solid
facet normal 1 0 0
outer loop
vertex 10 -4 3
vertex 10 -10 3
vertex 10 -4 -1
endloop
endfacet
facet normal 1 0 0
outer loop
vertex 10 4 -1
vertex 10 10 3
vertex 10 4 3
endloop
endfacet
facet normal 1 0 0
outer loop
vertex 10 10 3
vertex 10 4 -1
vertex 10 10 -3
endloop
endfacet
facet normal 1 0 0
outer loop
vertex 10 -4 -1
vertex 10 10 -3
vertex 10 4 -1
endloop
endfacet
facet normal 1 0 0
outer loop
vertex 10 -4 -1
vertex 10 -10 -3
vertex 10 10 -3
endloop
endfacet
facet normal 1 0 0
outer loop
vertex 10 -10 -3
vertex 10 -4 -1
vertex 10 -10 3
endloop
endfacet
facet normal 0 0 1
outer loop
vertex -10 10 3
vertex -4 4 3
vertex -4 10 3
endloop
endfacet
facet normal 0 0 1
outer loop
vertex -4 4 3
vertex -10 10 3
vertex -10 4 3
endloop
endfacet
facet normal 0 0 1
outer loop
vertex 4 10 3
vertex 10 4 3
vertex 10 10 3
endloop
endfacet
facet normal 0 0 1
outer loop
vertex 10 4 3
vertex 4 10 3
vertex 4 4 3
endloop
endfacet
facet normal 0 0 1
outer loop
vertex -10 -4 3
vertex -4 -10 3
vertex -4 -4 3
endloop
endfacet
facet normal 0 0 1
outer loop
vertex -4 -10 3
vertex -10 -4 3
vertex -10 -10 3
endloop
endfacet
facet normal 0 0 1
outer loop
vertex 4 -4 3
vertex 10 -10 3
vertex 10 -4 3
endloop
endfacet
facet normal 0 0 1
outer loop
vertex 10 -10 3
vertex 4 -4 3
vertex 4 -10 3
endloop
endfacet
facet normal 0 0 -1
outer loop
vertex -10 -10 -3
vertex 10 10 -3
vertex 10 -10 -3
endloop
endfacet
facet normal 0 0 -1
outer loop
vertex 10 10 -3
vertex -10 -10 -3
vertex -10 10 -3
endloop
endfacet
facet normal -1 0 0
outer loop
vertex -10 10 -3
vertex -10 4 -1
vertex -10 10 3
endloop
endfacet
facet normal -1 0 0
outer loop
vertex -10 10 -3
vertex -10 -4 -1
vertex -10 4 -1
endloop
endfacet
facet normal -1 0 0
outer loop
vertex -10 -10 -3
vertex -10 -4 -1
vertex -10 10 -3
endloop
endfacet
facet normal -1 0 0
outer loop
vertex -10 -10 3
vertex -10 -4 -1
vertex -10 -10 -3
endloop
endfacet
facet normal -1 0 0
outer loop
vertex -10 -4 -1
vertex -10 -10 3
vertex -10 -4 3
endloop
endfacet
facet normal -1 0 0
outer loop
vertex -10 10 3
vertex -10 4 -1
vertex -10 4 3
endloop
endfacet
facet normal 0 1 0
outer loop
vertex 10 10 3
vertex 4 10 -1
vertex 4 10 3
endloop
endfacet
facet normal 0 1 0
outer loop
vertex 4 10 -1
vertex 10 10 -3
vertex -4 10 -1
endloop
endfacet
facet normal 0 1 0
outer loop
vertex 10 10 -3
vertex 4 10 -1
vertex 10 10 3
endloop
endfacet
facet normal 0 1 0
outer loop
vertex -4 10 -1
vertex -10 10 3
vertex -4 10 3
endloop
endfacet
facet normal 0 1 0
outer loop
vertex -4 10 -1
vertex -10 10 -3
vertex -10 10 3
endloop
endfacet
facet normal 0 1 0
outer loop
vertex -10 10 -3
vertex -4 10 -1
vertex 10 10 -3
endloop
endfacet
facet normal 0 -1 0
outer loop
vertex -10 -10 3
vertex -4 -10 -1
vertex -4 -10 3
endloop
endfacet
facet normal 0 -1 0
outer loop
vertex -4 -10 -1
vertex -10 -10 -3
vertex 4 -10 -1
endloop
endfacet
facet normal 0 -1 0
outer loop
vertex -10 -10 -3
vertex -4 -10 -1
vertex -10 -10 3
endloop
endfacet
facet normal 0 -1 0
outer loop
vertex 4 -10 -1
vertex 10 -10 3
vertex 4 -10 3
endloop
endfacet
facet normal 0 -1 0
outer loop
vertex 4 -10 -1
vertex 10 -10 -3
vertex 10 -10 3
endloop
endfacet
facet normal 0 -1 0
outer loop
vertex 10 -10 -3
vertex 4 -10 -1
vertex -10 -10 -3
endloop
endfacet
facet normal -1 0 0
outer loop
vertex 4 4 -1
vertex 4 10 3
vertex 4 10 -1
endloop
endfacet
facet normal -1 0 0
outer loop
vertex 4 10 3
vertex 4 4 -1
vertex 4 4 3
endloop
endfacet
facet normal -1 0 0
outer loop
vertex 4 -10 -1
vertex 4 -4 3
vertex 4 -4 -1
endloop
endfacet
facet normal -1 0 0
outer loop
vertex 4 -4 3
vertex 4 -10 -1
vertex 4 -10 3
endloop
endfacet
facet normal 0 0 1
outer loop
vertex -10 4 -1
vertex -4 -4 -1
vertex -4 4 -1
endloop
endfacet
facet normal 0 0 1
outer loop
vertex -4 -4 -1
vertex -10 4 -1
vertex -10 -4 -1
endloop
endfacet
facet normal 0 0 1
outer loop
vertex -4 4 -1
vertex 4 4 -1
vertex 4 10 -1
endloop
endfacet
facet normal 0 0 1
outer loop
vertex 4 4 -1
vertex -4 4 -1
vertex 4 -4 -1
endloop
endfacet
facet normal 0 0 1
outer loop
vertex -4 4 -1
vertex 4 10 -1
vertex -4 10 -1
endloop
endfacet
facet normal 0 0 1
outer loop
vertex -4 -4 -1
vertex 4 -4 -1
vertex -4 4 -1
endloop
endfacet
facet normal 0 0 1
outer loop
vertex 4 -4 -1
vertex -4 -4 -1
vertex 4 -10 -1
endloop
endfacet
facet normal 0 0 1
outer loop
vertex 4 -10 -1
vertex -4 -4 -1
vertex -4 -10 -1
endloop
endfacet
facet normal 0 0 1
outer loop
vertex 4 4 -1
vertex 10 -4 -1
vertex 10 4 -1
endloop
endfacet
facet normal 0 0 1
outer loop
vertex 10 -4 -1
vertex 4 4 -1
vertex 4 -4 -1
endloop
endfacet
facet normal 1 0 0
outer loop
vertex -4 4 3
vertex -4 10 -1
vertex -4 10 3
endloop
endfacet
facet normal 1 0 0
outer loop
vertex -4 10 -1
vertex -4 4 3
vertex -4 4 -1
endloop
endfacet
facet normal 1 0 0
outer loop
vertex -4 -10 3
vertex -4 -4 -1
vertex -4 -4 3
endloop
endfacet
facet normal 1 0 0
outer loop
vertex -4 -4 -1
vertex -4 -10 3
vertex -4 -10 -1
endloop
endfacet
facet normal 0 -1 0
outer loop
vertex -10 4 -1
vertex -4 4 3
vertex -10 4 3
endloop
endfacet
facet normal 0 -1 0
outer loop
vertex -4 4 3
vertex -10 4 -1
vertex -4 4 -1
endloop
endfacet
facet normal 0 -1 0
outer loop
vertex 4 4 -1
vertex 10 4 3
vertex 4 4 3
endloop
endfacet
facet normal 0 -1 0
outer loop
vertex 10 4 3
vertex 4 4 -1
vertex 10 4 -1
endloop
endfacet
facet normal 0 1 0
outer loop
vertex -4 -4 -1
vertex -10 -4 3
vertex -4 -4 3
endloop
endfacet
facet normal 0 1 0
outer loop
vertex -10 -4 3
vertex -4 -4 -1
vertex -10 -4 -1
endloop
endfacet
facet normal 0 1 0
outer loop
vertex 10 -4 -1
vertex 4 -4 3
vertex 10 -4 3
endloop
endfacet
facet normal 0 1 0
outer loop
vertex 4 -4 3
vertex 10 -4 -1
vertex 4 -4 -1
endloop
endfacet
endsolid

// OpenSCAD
length=20;
height=6;
width=20;
proportion=2.5;
difference(){
cube(size=[length,width,height],center=true);
translate([0,-width/proportion,height/3])
     cube(size=[length/proportion,width*4,height],center=true);
translate([-length/proportion,0,height/3])
     cube(size=[length*4,width/proportion,height],center=true);
};
